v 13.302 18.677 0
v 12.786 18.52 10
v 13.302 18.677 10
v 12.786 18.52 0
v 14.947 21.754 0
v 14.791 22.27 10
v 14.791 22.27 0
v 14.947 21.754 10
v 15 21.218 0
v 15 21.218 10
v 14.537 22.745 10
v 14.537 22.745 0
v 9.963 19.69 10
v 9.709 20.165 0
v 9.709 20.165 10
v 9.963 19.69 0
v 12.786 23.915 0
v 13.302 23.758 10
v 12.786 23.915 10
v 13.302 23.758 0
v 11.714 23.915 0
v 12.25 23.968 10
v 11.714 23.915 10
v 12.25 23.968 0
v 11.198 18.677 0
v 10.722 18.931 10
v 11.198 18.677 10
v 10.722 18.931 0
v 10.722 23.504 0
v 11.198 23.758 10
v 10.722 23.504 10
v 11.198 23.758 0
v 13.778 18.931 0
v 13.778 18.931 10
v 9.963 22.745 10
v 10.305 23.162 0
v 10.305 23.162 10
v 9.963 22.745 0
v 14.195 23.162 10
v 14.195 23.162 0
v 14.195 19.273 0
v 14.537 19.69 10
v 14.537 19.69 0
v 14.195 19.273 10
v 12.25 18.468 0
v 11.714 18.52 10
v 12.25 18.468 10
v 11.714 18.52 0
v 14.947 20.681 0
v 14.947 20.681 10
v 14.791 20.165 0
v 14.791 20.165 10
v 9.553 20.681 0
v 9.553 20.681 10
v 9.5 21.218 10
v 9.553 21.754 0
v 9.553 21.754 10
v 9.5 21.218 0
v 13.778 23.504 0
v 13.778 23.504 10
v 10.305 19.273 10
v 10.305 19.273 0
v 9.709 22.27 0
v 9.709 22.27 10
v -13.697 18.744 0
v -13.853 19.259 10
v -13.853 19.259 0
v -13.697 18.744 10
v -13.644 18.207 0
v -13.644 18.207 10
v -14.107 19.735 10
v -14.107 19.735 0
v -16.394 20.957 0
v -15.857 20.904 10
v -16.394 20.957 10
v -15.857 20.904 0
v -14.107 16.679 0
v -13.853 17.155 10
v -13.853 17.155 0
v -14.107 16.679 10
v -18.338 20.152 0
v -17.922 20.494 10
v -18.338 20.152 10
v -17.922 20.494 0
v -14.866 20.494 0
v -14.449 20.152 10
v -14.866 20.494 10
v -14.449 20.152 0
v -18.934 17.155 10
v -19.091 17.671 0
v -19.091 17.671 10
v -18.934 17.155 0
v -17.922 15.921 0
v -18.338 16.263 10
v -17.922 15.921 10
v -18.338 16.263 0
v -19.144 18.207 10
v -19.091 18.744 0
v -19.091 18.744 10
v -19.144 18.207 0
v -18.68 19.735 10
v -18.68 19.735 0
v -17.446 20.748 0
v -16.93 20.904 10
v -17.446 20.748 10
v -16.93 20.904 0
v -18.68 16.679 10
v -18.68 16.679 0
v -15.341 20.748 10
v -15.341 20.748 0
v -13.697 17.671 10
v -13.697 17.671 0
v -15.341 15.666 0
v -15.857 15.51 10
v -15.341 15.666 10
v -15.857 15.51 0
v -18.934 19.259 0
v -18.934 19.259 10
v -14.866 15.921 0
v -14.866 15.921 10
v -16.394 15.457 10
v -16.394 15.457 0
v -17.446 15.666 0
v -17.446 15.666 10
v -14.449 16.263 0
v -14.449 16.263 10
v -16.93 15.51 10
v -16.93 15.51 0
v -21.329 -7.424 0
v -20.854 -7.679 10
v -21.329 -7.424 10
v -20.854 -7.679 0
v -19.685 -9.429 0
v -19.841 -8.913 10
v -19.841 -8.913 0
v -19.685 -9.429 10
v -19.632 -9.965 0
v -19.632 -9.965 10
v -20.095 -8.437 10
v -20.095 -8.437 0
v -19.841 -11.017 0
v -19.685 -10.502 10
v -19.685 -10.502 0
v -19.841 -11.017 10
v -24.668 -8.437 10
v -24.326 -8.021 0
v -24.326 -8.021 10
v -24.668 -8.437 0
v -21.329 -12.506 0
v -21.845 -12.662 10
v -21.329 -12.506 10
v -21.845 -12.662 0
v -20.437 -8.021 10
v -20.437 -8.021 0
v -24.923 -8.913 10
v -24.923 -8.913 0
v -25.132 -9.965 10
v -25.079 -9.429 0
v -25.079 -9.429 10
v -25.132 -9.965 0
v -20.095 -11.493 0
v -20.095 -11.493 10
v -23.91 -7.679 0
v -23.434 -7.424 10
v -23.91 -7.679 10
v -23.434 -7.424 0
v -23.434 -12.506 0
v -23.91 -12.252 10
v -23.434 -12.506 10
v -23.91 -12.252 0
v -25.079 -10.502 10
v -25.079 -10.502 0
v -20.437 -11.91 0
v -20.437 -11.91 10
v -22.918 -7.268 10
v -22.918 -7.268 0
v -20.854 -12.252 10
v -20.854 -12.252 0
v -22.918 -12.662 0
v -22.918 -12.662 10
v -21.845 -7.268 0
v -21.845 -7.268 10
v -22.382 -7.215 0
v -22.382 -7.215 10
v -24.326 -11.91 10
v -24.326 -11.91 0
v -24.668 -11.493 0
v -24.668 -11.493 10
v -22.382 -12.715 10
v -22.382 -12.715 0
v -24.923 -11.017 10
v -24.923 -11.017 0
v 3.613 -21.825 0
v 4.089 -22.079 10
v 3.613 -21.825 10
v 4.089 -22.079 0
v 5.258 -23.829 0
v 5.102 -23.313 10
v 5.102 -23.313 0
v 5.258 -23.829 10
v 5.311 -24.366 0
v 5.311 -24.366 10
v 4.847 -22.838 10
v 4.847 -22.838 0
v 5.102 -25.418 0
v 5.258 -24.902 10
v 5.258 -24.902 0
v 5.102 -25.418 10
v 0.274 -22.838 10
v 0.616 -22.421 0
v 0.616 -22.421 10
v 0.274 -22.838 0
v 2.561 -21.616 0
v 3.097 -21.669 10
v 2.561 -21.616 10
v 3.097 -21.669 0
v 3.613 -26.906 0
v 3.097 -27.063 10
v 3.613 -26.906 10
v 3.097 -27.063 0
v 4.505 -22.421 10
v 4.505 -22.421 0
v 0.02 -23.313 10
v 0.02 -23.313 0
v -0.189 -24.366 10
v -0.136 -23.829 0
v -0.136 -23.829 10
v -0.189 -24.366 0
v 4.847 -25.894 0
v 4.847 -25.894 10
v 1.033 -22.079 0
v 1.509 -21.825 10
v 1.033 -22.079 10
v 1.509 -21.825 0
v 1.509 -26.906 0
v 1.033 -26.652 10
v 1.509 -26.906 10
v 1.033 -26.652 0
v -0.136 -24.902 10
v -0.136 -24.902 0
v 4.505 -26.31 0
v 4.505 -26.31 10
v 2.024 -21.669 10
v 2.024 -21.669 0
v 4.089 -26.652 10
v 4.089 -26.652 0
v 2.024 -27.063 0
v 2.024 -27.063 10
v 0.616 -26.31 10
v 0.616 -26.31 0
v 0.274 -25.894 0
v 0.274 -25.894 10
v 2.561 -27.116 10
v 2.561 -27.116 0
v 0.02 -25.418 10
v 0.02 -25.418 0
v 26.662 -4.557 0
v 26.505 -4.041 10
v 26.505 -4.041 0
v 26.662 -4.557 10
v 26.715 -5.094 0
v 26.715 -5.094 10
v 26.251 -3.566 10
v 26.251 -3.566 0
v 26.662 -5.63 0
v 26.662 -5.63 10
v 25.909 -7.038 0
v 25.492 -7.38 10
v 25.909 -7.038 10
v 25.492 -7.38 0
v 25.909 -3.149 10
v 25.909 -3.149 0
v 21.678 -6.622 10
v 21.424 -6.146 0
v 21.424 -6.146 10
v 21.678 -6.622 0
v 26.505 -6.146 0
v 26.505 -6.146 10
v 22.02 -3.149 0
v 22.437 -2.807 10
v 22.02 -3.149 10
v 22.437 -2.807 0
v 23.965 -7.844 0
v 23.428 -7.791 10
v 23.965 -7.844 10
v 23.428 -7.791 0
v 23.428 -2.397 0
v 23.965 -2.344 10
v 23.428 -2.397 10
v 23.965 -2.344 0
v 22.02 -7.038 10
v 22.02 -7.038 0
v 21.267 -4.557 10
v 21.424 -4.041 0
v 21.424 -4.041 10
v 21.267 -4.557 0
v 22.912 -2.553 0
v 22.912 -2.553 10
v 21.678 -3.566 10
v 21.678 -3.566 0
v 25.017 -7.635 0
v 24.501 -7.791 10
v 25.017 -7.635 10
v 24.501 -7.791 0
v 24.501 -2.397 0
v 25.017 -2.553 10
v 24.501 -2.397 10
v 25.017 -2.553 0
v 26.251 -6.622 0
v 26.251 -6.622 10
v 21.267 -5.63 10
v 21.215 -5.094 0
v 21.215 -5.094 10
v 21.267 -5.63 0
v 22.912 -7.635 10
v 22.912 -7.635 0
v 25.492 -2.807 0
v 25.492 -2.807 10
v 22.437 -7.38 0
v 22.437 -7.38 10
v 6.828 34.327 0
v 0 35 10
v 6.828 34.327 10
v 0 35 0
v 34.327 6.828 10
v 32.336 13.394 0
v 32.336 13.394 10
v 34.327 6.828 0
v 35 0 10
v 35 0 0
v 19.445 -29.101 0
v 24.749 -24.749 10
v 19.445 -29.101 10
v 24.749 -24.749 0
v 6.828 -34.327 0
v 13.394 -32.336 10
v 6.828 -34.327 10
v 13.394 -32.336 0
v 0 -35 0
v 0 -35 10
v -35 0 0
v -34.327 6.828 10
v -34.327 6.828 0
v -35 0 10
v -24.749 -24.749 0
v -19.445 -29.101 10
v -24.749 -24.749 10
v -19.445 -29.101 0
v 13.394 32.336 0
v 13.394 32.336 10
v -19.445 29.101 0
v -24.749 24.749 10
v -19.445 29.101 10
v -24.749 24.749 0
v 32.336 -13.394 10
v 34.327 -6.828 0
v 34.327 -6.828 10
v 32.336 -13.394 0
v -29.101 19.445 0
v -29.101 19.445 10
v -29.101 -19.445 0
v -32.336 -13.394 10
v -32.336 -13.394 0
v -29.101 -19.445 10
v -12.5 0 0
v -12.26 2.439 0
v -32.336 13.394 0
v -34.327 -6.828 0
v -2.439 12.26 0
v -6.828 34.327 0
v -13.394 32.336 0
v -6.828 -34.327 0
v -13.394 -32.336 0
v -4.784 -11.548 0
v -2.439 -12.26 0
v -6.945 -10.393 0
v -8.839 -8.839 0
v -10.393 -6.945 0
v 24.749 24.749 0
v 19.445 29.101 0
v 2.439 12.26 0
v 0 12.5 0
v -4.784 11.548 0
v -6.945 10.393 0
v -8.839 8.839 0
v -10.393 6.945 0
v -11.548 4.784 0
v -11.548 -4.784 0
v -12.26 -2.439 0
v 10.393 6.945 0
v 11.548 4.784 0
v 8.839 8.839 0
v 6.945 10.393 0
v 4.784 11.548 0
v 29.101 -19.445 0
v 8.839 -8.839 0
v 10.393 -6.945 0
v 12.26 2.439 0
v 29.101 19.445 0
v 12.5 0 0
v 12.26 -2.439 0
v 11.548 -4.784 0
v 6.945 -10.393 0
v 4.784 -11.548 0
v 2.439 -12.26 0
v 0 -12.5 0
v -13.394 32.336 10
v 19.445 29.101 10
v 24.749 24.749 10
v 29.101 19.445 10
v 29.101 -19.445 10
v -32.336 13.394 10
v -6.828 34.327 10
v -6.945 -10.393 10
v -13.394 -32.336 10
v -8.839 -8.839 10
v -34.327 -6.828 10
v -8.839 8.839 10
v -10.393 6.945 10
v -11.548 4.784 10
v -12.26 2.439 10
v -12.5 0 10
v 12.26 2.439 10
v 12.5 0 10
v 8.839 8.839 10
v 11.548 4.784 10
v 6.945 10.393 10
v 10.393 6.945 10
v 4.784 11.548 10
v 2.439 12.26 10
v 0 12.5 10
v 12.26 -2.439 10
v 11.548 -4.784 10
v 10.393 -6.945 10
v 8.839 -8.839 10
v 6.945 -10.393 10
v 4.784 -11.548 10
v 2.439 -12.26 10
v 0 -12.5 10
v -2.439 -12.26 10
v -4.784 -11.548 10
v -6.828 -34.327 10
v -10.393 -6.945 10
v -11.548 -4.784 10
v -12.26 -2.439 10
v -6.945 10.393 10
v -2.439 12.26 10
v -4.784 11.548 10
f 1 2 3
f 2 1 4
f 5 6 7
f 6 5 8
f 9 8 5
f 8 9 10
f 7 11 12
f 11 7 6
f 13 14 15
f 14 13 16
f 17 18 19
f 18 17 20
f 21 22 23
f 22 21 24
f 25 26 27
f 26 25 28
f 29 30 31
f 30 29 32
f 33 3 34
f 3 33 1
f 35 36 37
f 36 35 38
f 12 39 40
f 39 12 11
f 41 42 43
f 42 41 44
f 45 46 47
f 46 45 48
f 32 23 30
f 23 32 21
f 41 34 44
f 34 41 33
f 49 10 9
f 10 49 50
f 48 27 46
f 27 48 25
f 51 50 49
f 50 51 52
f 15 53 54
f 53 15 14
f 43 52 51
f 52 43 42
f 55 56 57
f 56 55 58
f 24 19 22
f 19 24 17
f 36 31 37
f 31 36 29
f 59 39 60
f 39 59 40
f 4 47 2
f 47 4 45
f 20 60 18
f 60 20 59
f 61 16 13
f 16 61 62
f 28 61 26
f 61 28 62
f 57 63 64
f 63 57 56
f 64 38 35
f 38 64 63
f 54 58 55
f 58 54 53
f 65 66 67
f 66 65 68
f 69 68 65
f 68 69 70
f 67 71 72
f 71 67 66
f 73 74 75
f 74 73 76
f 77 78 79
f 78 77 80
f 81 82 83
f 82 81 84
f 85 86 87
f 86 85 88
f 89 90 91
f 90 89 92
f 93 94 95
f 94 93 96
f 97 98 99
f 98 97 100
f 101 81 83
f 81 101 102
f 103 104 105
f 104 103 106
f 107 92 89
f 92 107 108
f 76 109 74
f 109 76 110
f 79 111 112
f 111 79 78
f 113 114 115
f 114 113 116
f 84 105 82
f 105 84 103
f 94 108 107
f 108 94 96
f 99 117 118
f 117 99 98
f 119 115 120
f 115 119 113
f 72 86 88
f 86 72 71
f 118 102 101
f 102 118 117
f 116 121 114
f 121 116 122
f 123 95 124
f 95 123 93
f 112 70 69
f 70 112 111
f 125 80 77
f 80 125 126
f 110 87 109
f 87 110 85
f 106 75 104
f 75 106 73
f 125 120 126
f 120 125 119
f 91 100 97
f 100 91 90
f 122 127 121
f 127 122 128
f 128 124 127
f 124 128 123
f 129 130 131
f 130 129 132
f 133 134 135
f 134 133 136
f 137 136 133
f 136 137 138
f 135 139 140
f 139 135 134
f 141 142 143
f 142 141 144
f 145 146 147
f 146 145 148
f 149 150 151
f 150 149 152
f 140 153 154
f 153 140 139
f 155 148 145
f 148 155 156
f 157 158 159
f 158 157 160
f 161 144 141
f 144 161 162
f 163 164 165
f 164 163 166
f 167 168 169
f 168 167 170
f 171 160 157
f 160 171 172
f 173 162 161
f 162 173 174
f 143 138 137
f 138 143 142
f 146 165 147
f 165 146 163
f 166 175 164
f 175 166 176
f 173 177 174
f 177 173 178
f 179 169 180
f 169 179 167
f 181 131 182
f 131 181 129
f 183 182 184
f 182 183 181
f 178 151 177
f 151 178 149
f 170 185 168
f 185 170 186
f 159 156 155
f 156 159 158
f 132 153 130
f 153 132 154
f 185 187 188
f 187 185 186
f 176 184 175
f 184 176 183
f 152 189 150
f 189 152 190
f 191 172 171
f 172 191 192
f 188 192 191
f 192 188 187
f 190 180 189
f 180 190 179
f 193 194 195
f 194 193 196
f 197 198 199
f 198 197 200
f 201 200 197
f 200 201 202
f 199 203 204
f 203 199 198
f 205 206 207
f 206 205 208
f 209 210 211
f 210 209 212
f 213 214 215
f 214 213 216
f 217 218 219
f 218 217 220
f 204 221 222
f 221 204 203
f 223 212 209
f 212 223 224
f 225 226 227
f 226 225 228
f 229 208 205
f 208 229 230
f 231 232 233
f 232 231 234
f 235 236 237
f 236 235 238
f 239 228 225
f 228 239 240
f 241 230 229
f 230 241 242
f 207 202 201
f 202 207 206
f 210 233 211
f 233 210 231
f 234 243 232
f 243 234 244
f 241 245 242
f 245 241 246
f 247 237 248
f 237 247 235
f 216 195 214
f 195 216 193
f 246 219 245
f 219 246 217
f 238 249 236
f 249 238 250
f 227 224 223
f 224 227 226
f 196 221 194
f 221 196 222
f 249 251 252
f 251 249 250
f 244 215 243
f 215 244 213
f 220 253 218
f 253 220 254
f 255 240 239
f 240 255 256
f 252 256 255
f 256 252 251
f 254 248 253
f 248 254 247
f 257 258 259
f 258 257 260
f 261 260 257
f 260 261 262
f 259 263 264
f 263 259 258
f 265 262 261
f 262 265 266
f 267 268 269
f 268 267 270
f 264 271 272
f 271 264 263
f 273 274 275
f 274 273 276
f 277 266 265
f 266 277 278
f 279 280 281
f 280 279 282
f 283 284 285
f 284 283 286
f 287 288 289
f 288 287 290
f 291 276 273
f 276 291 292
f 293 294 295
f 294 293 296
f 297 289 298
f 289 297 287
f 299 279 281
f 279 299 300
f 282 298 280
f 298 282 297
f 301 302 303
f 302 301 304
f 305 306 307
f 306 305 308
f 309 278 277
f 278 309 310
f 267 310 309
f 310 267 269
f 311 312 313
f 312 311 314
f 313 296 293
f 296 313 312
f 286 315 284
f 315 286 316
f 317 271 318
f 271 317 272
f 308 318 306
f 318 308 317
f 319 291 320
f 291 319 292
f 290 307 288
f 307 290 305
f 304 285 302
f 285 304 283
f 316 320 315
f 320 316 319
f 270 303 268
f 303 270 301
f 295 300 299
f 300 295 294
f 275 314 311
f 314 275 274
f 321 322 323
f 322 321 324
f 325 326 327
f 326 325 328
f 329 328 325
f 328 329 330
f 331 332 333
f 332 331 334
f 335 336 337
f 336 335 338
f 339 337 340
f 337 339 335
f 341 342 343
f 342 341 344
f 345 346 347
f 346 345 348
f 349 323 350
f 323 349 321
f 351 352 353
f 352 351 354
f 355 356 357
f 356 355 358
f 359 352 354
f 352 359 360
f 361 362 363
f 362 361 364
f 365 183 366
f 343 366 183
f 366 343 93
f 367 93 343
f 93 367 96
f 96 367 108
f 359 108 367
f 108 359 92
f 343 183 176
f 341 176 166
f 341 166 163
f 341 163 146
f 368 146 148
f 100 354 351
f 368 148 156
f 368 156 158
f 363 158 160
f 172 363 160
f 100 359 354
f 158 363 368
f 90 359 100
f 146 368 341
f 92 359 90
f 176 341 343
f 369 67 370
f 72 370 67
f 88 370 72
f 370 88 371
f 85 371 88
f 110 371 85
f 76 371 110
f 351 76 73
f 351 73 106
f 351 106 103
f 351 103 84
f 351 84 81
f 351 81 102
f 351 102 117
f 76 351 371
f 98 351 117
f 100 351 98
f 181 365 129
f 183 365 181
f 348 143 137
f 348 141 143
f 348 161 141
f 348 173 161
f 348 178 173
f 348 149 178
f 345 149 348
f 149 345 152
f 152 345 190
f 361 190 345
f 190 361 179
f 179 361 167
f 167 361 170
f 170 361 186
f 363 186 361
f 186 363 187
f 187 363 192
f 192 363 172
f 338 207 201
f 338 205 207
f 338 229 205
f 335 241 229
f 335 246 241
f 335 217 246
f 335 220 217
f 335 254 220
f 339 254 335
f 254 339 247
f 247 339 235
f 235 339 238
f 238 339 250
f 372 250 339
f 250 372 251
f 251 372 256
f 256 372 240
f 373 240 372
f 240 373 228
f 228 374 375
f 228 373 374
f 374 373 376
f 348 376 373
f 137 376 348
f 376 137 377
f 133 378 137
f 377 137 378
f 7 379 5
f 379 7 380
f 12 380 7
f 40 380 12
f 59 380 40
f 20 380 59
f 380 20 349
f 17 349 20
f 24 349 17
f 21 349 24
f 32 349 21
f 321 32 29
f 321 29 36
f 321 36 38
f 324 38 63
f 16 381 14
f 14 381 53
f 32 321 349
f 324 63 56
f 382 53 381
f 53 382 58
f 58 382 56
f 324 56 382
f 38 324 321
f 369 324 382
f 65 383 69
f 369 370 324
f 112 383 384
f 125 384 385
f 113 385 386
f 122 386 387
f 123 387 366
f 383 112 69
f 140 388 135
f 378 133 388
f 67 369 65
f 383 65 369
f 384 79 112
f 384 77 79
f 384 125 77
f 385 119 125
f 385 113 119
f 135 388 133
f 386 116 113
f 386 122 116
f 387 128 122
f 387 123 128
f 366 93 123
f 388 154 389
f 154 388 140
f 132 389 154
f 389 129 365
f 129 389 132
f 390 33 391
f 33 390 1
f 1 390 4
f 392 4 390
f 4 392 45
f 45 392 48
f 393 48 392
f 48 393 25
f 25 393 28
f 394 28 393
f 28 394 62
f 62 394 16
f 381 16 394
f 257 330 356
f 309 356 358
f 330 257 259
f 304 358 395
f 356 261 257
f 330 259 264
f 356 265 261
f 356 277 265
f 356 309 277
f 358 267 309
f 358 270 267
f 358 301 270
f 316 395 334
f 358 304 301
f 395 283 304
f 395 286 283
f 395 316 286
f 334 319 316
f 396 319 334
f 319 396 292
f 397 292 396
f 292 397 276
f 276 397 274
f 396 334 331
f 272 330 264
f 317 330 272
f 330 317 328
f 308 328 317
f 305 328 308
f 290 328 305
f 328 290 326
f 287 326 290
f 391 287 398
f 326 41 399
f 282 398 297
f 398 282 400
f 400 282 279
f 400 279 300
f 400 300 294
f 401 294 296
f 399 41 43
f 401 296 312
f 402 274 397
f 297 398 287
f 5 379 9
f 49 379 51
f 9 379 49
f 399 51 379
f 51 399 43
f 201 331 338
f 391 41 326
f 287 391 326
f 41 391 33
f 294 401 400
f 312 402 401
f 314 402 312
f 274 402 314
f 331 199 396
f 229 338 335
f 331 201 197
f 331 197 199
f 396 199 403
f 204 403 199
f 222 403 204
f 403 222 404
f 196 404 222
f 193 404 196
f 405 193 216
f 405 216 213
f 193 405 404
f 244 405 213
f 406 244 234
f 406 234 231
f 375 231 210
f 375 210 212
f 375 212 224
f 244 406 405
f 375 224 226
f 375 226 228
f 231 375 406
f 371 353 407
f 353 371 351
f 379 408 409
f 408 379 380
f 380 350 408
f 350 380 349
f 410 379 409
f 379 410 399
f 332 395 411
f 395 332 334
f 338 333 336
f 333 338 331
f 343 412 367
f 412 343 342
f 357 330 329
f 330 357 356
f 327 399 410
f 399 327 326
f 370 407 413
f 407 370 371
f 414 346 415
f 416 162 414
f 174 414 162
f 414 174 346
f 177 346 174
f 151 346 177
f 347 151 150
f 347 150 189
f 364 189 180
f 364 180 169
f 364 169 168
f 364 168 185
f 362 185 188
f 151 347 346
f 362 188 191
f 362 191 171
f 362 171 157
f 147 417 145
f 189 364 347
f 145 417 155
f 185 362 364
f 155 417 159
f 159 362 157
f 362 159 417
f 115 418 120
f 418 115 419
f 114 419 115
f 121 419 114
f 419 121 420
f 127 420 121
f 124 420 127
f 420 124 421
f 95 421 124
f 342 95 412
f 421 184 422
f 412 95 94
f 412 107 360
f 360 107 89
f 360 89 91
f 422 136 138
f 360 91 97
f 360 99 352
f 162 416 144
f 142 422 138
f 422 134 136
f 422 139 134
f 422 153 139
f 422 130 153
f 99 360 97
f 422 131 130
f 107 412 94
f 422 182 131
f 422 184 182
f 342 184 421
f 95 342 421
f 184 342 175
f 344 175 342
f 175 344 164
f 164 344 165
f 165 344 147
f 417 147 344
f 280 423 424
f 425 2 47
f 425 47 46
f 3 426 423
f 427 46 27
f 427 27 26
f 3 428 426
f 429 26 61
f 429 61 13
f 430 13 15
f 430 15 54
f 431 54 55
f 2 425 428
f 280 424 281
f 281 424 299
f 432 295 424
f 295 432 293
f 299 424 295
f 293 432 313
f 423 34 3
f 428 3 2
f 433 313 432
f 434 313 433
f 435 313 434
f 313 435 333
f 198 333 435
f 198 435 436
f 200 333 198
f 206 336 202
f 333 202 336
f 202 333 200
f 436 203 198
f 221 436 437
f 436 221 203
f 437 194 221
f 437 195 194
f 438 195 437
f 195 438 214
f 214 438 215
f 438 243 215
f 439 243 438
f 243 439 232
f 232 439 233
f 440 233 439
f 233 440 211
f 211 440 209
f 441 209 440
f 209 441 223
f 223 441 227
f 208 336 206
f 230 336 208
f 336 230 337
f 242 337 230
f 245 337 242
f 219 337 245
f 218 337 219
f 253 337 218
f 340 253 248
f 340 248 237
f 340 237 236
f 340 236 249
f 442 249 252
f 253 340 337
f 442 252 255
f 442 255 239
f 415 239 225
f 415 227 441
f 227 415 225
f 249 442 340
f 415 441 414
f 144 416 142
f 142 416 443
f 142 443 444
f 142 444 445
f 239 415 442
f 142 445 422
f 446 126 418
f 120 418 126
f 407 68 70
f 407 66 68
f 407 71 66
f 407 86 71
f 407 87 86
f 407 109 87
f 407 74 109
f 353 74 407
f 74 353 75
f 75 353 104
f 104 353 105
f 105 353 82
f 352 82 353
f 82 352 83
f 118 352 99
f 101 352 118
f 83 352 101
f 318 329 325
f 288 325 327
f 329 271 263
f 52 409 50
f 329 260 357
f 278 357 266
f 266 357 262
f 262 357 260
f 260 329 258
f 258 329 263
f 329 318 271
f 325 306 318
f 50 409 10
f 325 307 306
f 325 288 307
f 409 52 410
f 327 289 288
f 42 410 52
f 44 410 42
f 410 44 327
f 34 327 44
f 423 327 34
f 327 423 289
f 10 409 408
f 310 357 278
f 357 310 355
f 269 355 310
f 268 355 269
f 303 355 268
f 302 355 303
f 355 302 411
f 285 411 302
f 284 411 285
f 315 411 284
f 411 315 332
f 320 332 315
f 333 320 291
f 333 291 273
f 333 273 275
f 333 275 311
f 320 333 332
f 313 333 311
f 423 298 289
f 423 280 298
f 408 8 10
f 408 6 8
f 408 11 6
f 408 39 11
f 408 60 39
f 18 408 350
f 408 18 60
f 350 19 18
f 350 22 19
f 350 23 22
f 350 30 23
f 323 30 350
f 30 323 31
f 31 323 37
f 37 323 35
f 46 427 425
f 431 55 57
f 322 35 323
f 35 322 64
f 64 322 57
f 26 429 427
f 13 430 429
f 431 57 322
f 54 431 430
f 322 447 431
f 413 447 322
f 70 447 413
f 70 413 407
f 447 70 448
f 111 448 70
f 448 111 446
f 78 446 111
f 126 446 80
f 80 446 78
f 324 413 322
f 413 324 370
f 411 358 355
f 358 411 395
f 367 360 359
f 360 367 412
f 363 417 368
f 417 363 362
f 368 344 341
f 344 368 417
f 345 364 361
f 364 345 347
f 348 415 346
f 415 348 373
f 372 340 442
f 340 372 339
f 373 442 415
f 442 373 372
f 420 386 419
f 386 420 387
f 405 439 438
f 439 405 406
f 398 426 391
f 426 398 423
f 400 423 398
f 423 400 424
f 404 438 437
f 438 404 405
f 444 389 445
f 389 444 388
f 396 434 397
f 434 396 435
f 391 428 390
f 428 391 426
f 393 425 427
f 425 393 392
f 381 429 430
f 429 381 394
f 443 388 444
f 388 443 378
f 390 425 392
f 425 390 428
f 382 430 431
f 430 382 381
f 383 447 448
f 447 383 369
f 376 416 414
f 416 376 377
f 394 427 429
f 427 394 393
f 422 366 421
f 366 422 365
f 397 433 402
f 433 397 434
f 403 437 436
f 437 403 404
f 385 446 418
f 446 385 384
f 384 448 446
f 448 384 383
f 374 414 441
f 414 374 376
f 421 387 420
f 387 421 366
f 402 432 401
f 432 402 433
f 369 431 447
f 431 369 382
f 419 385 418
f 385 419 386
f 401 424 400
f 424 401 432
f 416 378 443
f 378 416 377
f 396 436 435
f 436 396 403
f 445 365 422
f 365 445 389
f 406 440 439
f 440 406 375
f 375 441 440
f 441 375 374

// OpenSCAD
$fn = 32;

// ----------------------------------------------------------------------
// Flange Ø70 x 10
// 5 holes on a Ø49 bolt circle, bolted joints
// ----------------------------------------------------------------------

// --- parameters (mm) ---
flange_d = 70;   // outside diameter of the flange
thickness = 10;  // flange thickness
holes = 5;       // number of bolt holes
pcd = 49;        // bolt circle diameter
start_deg = 60;  // angle of the first hole, from +X
hole_d = 5.5;    // bolt hole diameter
bore_d = 25;     // central through bore
hub_d = 33;      // hub outside diameter
hub_h = 0;       // hub height above the flange face (0 = no hub)

// --- derived feature positions (mm) ---
height = thickness + hub_h;  // = 10   overall height of the part
pcd_r = pcd / 2;             // = 24.5   bolt circle radius
hole_step = 360 / holes;     // = 72   angular pitch
feature_centers = [
  [pcd_r * cos(start_deg + 0 * hole_step), pcd_r * sin(start_deg + 0 * hole_step)],
  [pcd_r * cos(start_deg + 1 * hole_step), pcd_r * sin(start_deg + 1 * hole_step)],
  [pcd_r * cos(start_deg + 2 * hole_step), pcd_r * sin(start_deg + 2 * hole_step)],
  [pcd_r * cos(start_deg + 3 * hole_step), pcd_r * sin(start_deg + 3 * hole_step)],
  [pcd_r * cos(start_deg + 4 * hole_step), pcd_r * sin(start_deg + 4 * hole_step)]
];   // bolt hole centres on the pitch circle

// flange disc, every hole and the bore cut straight through
difference() {
  union() {
    cylinder(d = flange_d, h = thickness);
  }
  translate([0, 0, -1]) cylinder(d = bore_d, h = height + 2);  // bore, through
  for (centre = feature_centers)
    translate([centre[0], centre[1], -1]) cylinder(d = hole_d, h = thickness + 2);
}
